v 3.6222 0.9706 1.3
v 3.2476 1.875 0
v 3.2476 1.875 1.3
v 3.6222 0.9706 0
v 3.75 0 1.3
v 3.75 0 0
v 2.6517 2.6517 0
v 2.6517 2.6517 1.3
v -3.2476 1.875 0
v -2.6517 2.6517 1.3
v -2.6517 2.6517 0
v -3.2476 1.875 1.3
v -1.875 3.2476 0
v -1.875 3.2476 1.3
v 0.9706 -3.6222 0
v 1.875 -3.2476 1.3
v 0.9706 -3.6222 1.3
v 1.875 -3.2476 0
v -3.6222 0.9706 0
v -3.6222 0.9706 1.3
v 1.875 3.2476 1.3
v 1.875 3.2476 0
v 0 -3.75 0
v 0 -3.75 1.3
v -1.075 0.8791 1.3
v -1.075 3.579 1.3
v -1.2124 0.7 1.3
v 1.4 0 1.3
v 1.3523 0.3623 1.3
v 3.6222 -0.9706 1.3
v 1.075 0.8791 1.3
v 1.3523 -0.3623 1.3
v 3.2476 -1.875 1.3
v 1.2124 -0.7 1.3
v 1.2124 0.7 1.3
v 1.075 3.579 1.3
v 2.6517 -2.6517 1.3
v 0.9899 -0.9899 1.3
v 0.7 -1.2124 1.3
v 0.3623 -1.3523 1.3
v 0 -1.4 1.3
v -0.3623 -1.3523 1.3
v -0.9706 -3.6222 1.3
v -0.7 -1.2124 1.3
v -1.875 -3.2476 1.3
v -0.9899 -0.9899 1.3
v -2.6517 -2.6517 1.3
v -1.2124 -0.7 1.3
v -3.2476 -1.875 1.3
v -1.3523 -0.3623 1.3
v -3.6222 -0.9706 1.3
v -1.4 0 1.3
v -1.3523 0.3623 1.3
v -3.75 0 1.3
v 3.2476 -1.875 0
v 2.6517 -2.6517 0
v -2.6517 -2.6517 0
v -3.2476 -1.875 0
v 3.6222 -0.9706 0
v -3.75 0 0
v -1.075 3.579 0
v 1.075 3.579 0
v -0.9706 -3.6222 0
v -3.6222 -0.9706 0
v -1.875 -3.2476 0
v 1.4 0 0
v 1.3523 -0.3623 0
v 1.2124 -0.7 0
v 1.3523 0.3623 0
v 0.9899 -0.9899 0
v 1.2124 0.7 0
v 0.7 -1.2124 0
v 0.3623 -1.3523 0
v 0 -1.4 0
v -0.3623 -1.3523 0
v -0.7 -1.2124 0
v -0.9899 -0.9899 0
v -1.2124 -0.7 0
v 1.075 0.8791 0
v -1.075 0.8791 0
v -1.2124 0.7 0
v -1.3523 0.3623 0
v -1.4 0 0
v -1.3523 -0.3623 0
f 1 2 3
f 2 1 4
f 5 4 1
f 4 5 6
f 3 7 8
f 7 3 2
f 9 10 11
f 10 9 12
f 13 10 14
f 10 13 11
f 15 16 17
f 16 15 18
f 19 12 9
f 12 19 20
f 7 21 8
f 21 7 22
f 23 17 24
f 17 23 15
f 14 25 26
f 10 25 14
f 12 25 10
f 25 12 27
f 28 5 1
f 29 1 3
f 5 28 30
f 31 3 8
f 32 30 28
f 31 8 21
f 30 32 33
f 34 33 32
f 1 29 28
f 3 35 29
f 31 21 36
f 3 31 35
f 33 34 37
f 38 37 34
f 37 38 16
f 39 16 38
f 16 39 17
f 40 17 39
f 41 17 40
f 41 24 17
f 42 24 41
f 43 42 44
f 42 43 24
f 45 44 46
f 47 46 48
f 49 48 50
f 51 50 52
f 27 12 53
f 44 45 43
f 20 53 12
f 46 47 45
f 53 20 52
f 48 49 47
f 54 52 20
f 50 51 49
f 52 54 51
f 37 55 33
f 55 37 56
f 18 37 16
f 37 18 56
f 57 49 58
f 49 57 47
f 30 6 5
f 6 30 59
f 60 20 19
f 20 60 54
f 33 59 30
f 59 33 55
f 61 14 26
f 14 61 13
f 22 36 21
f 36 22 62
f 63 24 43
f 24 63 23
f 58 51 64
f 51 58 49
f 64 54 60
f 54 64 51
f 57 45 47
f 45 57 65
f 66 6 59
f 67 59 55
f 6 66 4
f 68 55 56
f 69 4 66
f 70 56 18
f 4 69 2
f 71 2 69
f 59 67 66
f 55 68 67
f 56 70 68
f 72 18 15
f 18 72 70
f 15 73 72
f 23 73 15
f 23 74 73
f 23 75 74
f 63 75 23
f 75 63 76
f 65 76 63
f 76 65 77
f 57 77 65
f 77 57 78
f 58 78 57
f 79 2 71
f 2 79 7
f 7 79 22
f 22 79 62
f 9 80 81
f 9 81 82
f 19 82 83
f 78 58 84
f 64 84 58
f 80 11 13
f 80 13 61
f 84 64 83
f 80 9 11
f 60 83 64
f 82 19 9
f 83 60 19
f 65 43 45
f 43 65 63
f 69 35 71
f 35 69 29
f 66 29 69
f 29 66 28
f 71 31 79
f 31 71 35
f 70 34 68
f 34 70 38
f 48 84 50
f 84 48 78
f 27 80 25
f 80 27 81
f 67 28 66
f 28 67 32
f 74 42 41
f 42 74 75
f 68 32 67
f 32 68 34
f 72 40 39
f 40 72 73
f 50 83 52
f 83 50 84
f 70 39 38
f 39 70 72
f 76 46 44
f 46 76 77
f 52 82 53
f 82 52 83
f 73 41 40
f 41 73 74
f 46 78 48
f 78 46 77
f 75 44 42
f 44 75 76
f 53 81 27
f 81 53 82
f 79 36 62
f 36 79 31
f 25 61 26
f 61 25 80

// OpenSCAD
$fn=24;

module clip(od,id,t,ow){
  difference(){
    difference(){
      cylinder(d=od,h=t);
      translate([0,0,-0.1]) cylinder(d=id,h=t+0.2);
    }
    translate([-ow/2,0,-0.2]) cube([ow,od/2+1,t+0.4]);
  }
}

// V70 v4 rack-pin clip.
// Reference topology: V50 plate-retainer clip.
// Target groove Ø3.10; relaxed ID Ø2.80; opening 2.15.
// Outer diameter widened to Ø7.50 for stronger arms.
clip(7.50,2.80,1.30,2.15);
